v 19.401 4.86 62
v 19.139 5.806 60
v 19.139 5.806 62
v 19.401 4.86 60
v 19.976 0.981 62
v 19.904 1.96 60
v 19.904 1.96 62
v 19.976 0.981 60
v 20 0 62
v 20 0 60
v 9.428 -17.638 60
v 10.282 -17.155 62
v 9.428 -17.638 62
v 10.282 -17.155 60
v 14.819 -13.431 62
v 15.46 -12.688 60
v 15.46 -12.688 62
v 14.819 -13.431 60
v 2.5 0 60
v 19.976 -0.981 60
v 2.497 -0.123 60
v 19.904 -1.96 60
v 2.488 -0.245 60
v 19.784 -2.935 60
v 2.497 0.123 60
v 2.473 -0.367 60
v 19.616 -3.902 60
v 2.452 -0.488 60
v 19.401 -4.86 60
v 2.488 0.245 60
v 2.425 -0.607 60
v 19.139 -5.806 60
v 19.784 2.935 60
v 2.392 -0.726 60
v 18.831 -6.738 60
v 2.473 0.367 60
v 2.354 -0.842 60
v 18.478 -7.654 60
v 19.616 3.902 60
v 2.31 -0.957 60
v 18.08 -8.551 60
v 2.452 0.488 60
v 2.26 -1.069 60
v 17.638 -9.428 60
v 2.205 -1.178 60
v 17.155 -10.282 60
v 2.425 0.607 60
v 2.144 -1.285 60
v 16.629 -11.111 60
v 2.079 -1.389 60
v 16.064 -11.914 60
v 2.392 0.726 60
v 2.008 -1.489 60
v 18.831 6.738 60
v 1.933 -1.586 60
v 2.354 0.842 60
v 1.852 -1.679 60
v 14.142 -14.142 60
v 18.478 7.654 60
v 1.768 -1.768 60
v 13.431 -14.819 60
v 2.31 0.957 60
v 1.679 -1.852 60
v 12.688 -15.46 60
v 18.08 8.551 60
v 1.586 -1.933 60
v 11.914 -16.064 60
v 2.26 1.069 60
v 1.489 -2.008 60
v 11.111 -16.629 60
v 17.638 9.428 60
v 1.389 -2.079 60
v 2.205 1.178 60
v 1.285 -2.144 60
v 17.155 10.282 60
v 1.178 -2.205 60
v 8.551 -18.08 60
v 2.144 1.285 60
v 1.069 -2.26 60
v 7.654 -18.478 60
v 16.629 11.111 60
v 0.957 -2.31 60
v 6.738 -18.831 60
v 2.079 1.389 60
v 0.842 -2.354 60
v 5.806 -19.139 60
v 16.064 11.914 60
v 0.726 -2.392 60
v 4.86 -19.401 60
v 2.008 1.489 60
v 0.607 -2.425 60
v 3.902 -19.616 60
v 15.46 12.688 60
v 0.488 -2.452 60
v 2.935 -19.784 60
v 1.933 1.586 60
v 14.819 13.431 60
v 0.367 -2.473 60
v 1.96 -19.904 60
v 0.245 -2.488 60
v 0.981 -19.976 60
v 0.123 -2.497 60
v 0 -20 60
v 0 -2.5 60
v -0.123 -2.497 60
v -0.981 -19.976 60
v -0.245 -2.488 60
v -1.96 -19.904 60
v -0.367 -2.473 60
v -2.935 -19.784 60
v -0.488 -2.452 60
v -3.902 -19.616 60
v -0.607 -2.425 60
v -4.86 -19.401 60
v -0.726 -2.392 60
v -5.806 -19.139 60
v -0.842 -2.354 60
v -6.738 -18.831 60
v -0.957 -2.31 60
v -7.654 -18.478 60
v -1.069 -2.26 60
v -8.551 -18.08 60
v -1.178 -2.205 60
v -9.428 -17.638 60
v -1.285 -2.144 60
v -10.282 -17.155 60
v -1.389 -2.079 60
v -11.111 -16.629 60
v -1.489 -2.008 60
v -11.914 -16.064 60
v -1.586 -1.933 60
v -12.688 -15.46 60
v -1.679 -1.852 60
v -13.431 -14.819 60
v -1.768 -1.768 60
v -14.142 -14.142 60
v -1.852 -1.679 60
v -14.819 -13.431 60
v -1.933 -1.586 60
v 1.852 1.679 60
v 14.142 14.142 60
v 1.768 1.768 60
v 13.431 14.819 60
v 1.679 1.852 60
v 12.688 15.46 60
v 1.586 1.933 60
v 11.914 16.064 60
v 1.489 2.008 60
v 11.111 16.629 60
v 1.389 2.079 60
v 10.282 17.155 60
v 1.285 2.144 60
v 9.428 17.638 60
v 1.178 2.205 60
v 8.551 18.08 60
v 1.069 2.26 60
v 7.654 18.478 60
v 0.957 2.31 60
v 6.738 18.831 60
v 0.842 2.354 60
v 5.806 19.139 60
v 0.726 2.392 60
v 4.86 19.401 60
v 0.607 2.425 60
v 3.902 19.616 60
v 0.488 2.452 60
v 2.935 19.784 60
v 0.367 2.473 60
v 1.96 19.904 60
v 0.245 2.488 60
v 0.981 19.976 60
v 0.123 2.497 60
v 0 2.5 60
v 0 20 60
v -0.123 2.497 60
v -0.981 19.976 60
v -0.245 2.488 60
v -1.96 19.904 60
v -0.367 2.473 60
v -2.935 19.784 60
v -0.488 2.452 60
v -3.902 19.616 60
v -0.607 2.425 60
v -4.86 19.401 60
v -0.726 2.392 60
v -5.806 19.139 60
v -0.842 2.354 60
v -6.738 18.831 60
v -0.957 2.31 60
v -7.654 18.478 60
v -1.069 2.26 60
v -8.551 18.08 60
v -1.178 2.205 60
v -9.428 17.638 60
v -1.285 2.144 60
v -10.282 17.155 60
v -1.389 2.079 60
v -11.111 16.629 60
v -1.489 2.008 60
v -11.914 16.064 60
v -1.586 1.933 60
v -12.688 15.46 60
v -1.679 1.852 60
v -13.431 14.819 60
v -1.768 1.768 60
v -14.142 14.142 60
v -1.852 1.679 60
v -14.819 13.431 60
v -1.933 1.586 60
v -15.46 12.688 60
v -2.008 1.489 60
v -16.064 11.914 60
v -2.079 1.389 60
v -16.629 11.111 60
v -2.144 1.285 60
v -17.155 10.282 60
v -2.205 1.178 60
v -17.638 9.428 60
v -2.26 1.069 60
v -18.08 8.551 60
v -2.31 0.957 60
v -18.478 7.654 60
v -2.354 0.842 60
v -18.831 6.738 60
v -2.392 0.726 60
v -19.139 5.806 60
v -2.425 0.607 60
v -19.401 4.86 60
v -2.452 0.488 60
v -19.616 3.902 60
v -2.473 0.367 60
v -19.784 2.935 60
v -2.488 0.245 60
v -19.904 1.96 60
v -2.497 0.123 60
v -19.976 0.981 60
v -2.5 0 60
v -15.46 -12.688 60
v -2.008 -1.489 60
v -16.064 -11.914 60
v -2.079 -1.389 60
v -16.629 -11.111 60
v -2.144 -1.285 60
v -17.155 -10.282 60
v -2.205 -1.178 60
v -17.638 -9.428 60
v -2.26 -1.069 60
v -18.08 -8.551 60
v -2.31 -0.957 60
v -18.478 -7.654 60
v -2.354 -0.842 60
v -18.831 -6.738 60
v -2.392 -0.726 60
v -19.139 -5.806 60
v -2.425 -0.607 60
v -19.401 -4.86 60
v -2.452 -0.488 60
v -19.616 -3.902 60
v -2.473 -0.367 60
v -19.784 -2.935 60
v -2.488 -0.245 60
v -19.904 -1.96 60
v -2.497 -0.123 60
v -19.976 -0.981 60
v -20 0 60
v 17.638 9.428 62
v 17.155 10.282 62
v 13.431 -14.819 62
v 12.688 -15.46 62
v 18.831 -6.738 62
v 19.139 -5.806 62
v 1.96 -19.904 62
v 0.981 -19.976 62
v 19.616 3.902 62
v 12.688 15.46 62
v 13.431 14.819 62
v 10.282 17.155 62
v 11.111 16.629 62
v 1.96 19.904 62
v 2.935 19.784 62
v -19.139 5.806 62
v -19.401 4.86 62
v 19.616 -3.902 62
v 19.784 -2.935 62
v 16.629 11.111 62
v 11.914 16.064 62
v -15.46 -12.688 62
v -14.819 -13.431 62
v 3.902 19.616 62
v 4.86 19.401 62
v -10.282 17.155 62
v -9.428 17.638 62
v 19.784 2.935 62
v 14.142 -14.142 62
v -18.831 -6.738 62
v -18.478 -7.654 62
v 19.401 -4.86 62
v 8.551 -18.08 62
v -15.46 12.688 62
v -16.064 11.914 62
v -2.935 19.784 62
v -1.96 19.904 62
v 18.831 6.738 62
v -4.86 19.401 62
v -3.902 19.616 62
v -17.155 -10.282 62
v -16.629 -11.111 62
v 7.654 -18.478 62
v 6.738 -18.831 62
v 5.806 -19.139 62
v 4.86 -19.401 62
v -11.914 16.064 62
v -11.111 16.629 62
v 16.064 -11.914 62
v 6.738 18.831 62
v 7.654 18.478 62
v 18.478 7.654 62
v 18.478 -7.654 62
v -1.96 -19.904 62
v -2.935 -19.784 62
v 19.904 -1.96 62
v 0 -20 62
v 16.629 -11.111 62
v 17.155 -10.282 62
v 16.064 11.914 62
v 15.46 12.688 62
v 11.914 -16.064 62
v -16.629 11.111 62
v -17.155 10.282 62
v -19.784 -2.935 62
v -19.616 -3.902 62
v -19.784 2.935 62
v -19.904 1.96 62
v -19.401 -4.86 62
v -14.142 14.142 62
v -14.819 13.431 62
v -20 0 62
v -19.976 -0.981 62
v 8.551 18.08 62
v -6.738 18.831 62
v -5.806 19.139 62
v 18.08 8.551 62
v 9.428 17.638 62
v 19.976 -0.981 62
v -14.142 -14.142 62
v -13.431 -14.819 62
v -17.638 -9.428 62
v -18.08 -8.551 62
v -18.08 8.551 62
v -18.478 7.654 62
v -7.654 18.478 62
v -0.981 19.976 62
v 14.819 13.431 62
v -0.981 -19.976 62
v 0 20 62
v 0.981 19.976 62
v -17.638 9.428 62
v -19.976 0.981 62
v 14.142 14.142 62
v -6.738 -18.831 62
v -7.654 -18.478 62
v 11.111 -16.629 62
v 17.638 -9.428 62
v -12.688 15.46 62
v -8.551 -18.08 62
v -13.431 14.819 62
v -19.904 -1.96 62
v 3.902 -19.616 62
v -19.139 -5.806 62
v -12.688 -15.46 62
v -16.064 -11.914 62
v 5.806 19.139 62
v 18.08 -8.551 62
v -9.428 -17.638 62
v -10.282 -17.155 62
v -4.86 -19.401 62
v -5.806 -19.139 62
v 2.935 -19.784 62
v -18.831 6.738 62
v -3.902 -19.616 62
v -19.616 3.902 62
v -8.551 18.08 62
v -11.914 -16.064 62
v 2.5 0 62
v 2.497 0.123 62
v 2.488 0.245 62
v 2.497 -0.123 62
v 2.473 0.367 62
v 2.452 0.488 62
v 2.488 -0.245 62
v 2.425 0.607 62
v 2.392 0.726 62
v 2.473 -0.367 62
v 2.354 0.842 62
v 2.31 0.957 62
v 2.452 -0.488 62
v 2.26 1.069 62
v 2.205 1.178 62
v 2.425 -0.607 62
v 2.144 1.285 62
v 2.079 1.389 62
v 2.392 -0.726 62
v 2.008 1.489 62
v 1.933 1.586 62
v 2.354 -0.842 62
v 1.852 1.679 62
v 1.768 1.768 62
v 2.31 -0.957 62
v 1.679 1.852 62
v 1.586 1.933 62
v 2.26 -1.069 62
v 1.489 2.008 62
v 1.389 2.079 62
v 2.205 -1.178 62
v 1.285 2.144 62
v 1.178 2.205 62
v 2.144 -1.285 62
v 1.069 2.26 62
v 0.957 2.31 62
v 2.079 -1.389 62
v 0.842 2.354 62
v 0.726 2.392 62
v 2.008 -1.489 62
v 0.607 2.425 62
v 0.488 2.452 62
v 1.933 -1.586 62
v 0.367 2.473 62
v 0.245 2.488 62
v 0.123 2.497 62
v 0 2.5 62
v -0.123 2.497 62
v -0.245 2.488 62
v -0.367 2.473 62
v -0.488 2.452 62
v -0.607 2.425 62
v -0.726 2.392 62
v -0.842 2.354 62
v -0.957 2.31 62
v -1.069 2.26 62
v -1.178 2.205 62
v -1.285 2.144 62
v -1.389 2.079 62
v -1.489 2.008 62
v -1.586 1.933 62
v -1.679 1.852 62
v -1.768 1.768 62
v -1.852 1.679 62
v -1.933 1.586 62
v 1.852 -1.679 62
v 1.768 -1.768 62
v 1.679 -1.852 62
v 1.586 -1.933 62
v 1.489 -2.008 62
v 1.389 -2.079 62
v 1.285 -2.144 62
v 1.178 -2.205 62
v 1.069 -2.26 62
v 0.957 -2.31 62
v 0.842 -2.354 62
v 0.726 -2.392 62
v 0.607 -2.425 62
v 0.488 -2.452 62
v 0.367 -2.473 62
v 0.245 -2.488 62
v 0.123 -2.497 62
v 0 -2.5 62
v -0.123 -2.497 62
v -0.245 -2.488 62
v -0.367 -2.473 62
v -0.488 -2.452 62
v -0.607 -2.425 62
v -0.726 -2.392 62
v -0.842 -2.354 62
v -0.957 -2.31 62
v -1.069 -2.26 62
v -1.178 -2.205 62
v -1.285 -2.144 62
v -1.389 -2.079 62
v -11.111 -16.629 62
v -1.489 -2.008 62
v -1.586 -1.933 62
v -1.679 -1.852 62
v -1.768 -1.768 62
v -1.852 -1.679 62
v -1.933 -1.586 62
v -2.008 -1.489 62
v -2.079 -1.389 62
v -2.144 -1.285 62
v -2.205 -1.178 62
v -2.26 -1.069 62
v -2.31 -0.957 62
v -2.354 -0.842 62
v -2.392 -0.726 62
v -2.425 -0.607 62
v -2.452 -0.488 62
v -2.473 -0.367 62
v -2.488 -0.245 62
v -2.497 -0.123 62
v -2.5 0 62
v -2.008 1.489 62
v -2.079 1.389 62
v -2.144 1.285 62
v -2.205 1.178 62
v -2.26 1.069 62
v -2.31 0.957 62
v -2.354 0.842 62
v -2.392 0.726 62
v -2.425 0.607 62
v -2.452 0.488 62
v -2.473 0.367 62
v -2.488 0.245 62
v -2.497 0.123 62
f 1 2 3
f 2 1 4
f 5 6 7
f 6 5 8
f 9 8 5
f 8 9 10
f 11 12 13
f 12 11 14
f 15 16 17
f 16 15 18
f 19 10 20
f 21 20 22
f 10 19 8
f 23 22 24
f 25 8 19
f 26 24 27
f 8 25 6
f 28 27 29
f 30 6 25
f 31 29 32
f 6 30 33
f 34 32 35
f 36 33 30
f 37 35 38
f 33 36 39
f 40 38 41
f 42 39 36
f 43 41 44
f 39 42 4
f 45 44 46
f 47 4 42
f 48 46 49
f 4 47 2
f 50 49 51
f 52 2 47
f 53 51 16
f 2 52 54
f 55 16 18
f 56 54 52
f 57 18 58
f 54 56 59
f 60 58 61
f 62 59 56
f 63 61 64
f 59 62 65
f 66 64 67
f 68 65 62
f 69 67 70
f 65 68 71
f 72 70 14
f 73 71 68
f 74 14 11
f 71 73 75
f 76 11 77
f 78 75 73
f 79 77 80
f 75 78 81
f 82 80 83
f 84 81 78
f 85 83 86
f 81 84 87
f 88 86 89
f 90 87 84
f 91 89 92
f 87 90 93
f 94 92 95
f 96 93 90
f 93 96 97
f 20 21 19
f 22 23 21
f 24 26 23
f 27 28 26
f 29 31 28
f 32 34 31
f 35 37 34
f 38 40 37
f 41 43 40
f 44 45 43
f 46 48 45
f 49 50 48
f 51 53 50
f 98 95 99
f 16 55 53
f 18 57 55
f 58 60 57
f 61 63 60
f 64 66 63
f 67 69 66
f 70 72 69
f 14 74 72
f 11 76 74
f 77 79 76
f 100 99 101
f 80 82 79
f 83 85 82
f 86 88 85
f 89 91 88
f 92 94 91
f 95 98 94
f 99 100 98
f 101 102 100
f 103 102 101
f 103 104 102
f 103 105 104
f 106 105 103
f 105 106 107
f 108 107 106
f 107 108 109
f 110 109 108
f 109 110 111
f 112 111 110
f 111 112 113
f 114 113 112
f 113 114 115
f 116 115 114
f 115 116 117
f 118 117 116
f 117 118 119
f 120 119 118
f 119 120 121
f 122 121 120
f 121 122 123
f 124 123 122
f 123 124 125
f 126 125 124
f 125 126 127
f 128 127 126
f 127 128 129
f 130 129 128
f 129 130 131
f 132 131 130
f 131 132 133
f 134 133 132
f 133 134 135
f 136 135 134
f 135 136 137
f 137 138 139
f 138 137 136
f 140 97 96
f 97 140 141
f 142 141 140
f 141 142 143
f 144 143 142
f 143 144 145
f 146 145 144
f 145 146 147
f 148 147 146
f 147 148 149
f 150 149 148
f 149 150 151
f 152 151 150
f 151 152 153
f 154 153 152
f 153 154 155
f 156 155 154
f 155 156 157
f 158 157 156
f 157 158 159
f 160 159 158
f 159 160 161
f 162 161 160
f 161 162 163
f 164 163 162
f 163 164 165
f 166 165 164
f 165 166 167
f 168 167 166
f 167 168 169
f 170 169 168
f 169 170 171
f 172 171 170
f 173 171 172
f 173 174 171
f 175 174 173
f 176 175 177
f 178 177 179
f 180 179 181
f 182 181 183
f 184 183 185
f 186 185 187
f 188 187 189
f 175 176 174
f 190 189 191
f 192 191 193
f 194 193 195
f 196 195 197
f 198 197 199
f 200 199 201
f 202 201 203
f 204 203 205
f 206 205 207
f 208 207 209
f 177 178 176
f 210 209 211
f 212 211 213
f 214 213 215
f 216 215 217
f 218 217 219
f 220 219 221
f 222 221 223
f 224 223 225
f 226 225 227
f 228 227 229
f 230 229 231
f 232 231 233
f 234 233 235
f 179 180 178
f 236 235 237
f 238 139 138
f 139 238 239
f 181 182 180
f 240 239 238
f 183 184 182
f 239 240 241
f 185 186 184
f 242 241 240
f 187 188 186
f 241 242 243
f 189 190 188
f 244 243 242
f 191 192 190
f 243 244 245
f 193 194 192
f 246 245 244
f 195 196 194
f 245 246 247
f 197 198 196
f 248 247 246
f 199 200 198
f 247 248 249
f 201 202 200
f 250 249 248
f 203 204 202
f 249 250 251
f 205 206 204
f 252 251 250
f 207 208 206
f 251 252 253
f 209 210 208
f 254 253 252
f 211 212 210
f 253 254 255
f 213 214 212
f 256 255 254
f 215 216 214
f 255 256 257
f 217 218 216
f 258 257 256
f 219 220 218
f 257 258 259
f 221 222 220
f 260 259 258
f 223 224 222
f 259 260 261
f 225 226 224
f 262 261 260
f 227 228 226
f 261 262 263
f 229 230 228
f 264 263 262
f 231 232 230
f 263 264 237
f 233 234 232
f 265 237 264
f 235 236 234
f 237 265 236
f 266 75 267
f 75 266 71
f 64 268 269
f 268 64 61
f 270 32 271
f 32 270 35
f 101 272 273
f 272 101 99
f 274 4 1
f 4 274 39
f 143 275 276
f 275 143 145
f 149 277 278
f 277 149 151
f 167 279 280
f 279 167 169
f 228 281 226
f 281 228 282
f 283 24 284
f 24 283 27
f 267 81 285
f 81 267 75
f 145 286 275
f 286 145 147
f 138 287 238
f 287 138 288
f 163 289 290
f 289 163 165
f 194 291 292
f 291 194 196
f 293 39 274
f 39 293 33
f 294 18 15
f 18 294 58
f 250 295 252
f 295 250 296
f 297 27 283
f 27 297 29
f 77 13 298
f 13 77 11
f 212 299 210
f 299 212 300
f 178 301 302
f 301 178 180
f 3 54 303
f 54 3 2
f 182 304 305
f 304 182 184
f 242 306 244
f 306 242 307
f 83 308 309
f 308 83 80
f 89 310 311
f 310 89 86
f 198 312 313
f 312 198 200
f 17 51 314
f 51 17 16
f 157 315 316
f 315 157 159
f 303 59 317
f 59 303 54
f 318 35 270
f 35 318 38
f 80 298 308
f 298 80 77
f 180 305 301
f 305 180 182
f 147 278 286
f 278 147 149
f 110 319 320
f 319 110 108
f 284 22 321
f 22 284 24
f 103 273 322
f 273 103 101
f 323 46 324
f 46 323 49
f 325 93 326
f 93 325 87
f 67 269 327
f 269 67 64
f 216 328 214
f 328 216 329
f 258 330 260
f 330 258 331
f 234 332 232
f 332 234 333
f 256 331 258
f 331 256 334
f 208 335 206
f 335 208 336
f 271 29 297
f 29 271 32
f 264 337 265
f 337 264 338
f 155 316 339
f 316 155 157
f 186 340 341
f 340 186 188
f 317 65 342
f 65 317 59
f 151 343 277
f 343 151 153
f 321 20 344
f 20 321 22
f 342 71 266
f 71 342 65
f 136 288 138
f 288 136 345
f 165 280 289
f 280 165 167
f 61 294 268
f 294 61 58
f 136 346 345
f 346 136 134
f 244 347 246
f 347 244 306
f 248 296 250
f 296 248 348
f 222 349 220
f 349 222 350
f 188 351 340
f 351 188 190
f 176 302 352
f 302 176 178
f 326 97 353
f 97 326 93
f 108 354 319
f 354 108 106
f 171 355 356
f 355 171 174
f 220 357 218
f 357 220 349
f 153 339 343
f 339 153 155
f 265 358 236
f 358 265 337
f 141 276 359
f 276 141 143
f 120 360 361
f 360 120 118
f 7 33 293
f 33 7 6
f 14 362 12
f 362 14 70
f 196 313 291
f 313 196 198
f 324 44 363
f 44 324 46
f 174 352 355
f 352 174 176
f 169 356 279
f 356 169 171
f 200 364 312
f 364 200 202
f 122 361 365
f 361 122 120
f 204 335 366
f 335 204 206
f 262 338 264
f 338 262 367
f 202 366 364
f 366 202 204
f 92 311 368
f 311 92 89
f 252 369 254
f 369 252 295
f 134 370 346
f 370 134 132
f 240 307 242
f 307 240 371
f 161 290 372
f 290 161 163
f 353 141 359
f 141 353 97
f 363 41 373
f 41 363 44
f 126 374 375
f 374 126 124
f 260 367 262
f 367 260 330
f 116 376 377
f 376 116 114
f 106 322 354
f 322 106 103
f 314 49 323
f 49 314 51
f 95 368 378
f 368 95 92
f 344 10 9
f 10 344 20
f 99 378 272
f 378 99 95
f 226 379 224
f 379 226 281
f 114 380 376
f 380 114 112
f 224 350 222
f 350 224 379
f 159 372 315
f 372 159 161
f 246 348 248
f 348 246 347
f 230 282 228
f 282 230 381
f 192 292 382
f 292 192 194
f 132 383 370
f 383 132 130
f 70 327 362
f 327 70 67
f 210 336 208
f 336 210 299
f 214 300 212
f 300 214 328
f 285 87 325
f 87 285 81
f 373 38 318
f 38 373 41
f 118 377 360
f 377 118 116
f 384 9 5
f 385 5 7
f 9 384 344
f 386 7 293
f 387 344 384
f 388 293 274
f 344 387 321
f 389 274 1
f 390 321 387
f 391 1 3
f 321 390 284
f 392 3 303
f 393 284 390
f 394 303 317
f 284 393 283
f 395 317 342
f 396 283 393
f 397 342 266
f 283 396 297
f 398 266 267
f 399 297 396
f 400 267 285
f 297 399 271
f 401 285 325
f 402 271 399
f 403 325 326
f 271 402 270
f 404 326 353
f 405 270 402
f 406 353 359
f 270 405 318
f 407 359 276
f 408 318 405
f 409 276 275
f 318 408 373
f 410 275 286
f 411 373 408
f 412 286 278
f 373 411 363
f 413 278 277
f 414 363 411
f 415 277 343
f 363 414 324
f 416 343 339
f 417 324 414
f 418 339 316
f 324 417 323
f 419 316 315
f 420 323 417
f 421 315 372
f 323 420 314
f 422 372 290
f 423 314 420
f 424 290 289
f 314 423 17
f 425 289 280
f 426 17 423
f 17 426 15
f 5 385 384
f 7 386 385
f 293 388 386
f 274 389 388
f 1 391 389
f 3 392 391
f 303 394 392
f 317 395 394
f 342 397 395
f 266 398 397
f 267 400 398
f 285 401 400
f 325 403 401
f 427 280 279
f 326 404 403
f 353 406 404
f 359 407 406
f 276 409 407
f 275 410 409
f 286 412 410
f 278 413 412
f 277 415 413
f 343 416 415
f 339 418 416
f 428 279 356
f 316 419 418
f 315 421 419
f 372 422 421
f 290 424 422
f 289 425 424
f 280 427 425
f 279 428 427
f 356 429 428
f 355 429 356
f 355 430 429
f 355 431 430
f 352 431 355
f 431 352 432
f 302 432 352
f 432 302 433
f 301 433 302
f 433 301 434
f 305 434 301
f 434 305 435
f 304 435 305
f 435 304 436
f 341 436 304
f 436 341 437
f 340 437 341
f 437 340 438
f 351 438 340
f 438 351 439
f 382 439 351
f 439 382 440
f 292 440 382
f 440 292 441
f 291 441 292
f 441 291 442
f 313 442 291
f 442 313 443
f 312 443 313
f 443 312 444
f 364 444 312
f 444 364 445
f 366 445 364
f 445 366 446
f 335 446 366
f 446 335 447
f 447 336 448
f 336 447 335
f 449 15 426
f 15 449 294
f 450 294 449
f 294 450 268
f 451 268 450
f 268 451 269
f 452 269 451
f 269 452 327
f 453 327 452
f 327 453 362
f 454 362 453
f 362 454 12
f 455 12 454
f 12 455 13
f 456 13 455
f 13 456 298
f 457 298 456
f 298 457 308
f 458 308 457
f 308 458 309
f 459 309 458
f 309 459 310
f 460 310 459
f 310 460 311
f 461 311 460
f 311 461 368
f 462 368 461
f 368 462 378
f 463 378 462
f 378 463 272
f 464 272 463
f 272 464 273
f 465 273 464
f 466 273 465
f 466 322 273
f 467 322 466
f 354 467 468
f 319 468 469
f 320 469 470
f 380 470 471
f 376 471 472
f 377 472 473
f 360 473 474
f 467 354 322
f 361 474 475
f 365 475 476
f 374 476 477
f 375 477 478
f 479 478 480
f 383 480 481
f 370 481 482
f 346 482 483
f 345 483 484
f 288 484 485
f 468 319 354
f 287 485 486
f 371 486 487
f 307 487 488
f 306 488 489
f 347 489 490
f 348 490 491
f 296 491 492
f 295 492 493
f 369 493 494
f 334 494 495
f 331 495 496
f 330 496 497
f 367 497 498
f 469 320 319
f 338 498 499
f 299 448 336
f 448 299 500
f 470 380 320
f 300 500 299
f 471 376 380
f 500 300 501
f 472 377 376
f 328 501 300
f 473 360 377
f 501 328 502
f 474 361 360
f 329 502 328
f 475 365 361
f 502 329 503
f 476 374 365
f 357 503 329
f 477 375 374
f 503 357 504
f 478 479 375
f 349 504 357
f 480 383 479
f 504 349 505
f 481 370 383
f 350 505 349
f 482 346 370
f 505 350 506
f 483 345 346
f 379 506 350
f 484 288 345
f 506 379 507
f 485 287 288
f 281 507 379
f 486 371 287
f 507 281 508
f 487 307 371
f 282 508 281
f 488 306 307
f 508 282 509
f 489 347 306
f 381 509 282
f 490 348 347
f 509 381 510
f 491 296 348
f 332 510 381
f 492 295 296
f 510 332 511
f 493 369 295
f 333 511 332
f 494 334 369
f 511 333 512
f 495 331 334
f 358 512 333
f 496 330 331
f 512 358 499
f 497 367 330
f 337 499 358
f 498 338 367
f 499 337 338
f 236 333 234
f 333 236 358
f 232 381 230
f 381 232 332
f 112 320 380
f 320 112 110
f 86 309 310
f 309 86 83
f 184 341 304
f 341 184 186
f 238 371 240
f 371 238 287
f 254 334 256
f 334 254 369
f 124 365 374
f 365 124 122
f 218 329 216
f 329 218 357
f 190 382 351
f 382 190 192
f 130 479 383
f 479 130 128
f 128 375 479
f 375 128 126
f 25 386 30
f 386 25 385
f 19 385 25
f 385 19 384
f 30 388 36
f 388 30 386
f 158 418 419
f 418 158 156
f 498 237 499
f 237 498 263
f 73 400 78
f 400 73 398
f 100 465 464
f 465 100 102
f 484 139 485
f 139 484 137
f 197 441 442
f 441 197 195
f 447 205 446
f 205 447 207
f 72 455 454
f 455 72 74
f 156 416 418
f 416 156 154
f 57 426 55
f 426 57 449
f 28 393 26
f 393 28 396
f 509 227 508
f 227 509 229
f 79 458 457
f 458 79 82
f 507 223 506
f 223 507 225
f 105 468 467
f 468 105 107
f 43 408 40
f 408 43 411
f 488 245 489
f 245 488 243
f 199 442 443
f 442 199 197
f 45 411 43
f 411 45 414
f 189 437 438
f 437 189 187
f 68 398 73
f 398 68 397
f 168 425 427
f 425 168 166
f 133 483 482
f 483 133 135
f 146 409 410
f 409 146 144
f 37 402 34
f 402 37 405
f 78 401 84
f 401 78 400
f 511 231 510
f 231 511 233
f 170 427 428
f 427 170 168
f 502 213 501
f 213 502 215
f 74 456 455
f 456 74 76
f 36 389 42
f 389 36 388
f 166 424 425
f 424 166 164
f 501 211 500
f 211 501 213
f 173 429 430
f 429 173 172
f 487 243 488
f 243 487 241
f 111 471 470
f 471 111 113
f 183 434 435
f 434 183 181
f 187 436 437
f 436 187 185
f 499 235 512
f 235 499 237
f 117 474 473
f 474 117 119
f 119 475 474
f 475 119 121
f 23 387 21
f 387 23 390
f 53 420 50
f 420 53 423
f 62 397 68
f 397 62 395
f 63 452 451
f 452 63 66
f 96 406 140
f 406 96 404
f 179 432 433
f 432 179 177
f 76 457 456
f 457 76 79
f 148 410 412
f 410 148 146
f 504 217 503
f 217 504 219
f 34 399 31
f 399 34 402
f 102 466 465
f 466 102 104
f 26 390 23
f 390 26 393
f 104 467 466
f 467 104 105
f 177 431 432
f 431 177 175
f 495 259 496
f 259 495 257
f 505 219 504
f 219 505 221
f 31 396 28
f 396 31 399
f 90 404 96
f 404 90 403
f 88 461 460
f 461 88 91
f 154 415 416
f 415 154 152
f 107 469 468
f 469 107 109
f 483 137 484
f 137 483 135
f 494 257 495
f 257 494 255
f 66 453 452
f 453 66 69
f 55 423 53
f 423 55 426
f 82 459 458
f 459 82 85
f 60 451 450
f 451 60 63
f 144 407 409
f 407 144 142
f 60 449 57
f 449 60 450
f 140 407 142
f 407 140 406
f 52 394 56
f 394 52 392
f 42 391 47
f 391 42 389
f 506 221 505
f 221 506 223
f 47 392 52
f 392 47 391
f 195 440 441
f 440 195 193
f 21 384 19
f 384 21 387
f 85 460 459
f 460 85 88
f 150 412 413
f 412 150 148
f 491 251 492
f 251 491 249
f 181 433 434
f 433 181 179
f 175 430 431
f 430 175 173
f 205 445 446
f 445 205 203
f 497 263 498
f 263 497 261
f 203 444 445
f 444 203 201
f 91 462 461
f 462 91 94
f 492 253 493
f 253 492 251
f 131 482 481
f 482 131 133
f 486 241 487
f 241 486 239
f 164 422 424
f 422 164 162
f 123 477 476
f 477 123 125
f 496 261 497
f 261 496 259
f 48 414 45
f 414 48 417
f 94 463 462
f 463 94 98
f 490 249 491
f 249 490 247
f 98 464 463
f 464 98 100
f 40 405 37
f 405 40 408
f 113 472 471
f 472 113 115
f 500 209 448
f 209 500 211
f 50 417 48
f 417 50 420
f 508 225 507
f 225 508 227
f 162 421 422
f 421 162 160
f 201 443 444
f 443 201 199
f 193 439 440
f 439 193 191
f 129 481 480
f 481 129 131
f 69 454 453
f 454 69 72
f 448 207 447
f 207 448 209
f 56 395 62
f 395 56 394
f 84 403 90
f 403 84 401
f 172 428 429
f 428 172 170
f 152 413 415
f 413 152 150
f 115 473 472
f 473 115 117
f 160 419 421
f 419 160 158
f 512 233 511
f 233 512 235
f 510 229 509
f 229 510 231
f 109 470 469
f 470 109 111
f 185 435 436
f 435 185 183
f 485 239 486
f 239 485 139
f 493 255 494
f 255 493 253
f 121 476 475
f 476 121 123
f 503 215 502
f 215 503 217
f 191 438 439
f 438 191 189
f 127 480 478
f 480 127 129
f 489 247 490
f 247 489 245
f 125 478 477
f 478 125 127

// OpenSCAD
// file: common_params.scad
cylinder_radius = 20.000000;
cylinder_height = 60.000000;
wall_thickness = 2.000000;

cap_thickness = 2.000000;

rod_radius = 2.000000;
rod_height = 50.000000;

ring_outer_radius = 8.000000;
ring_inner_radius = 4.000000;
ring_thickness = 3.000000;
ring_z = 40.000000;

$fn = 128;
// main file
include <common_params.scad>;

hole_radius = 2.500000;

translate([0, 0, cylinder_height])
difference() {
    cylinder(h = cap_thickness, r = cylinder_radius);
    translate([0, 0, -0.1])
        cylinder(h = cap_thickness + 0.2, r = hole_radius);
}
